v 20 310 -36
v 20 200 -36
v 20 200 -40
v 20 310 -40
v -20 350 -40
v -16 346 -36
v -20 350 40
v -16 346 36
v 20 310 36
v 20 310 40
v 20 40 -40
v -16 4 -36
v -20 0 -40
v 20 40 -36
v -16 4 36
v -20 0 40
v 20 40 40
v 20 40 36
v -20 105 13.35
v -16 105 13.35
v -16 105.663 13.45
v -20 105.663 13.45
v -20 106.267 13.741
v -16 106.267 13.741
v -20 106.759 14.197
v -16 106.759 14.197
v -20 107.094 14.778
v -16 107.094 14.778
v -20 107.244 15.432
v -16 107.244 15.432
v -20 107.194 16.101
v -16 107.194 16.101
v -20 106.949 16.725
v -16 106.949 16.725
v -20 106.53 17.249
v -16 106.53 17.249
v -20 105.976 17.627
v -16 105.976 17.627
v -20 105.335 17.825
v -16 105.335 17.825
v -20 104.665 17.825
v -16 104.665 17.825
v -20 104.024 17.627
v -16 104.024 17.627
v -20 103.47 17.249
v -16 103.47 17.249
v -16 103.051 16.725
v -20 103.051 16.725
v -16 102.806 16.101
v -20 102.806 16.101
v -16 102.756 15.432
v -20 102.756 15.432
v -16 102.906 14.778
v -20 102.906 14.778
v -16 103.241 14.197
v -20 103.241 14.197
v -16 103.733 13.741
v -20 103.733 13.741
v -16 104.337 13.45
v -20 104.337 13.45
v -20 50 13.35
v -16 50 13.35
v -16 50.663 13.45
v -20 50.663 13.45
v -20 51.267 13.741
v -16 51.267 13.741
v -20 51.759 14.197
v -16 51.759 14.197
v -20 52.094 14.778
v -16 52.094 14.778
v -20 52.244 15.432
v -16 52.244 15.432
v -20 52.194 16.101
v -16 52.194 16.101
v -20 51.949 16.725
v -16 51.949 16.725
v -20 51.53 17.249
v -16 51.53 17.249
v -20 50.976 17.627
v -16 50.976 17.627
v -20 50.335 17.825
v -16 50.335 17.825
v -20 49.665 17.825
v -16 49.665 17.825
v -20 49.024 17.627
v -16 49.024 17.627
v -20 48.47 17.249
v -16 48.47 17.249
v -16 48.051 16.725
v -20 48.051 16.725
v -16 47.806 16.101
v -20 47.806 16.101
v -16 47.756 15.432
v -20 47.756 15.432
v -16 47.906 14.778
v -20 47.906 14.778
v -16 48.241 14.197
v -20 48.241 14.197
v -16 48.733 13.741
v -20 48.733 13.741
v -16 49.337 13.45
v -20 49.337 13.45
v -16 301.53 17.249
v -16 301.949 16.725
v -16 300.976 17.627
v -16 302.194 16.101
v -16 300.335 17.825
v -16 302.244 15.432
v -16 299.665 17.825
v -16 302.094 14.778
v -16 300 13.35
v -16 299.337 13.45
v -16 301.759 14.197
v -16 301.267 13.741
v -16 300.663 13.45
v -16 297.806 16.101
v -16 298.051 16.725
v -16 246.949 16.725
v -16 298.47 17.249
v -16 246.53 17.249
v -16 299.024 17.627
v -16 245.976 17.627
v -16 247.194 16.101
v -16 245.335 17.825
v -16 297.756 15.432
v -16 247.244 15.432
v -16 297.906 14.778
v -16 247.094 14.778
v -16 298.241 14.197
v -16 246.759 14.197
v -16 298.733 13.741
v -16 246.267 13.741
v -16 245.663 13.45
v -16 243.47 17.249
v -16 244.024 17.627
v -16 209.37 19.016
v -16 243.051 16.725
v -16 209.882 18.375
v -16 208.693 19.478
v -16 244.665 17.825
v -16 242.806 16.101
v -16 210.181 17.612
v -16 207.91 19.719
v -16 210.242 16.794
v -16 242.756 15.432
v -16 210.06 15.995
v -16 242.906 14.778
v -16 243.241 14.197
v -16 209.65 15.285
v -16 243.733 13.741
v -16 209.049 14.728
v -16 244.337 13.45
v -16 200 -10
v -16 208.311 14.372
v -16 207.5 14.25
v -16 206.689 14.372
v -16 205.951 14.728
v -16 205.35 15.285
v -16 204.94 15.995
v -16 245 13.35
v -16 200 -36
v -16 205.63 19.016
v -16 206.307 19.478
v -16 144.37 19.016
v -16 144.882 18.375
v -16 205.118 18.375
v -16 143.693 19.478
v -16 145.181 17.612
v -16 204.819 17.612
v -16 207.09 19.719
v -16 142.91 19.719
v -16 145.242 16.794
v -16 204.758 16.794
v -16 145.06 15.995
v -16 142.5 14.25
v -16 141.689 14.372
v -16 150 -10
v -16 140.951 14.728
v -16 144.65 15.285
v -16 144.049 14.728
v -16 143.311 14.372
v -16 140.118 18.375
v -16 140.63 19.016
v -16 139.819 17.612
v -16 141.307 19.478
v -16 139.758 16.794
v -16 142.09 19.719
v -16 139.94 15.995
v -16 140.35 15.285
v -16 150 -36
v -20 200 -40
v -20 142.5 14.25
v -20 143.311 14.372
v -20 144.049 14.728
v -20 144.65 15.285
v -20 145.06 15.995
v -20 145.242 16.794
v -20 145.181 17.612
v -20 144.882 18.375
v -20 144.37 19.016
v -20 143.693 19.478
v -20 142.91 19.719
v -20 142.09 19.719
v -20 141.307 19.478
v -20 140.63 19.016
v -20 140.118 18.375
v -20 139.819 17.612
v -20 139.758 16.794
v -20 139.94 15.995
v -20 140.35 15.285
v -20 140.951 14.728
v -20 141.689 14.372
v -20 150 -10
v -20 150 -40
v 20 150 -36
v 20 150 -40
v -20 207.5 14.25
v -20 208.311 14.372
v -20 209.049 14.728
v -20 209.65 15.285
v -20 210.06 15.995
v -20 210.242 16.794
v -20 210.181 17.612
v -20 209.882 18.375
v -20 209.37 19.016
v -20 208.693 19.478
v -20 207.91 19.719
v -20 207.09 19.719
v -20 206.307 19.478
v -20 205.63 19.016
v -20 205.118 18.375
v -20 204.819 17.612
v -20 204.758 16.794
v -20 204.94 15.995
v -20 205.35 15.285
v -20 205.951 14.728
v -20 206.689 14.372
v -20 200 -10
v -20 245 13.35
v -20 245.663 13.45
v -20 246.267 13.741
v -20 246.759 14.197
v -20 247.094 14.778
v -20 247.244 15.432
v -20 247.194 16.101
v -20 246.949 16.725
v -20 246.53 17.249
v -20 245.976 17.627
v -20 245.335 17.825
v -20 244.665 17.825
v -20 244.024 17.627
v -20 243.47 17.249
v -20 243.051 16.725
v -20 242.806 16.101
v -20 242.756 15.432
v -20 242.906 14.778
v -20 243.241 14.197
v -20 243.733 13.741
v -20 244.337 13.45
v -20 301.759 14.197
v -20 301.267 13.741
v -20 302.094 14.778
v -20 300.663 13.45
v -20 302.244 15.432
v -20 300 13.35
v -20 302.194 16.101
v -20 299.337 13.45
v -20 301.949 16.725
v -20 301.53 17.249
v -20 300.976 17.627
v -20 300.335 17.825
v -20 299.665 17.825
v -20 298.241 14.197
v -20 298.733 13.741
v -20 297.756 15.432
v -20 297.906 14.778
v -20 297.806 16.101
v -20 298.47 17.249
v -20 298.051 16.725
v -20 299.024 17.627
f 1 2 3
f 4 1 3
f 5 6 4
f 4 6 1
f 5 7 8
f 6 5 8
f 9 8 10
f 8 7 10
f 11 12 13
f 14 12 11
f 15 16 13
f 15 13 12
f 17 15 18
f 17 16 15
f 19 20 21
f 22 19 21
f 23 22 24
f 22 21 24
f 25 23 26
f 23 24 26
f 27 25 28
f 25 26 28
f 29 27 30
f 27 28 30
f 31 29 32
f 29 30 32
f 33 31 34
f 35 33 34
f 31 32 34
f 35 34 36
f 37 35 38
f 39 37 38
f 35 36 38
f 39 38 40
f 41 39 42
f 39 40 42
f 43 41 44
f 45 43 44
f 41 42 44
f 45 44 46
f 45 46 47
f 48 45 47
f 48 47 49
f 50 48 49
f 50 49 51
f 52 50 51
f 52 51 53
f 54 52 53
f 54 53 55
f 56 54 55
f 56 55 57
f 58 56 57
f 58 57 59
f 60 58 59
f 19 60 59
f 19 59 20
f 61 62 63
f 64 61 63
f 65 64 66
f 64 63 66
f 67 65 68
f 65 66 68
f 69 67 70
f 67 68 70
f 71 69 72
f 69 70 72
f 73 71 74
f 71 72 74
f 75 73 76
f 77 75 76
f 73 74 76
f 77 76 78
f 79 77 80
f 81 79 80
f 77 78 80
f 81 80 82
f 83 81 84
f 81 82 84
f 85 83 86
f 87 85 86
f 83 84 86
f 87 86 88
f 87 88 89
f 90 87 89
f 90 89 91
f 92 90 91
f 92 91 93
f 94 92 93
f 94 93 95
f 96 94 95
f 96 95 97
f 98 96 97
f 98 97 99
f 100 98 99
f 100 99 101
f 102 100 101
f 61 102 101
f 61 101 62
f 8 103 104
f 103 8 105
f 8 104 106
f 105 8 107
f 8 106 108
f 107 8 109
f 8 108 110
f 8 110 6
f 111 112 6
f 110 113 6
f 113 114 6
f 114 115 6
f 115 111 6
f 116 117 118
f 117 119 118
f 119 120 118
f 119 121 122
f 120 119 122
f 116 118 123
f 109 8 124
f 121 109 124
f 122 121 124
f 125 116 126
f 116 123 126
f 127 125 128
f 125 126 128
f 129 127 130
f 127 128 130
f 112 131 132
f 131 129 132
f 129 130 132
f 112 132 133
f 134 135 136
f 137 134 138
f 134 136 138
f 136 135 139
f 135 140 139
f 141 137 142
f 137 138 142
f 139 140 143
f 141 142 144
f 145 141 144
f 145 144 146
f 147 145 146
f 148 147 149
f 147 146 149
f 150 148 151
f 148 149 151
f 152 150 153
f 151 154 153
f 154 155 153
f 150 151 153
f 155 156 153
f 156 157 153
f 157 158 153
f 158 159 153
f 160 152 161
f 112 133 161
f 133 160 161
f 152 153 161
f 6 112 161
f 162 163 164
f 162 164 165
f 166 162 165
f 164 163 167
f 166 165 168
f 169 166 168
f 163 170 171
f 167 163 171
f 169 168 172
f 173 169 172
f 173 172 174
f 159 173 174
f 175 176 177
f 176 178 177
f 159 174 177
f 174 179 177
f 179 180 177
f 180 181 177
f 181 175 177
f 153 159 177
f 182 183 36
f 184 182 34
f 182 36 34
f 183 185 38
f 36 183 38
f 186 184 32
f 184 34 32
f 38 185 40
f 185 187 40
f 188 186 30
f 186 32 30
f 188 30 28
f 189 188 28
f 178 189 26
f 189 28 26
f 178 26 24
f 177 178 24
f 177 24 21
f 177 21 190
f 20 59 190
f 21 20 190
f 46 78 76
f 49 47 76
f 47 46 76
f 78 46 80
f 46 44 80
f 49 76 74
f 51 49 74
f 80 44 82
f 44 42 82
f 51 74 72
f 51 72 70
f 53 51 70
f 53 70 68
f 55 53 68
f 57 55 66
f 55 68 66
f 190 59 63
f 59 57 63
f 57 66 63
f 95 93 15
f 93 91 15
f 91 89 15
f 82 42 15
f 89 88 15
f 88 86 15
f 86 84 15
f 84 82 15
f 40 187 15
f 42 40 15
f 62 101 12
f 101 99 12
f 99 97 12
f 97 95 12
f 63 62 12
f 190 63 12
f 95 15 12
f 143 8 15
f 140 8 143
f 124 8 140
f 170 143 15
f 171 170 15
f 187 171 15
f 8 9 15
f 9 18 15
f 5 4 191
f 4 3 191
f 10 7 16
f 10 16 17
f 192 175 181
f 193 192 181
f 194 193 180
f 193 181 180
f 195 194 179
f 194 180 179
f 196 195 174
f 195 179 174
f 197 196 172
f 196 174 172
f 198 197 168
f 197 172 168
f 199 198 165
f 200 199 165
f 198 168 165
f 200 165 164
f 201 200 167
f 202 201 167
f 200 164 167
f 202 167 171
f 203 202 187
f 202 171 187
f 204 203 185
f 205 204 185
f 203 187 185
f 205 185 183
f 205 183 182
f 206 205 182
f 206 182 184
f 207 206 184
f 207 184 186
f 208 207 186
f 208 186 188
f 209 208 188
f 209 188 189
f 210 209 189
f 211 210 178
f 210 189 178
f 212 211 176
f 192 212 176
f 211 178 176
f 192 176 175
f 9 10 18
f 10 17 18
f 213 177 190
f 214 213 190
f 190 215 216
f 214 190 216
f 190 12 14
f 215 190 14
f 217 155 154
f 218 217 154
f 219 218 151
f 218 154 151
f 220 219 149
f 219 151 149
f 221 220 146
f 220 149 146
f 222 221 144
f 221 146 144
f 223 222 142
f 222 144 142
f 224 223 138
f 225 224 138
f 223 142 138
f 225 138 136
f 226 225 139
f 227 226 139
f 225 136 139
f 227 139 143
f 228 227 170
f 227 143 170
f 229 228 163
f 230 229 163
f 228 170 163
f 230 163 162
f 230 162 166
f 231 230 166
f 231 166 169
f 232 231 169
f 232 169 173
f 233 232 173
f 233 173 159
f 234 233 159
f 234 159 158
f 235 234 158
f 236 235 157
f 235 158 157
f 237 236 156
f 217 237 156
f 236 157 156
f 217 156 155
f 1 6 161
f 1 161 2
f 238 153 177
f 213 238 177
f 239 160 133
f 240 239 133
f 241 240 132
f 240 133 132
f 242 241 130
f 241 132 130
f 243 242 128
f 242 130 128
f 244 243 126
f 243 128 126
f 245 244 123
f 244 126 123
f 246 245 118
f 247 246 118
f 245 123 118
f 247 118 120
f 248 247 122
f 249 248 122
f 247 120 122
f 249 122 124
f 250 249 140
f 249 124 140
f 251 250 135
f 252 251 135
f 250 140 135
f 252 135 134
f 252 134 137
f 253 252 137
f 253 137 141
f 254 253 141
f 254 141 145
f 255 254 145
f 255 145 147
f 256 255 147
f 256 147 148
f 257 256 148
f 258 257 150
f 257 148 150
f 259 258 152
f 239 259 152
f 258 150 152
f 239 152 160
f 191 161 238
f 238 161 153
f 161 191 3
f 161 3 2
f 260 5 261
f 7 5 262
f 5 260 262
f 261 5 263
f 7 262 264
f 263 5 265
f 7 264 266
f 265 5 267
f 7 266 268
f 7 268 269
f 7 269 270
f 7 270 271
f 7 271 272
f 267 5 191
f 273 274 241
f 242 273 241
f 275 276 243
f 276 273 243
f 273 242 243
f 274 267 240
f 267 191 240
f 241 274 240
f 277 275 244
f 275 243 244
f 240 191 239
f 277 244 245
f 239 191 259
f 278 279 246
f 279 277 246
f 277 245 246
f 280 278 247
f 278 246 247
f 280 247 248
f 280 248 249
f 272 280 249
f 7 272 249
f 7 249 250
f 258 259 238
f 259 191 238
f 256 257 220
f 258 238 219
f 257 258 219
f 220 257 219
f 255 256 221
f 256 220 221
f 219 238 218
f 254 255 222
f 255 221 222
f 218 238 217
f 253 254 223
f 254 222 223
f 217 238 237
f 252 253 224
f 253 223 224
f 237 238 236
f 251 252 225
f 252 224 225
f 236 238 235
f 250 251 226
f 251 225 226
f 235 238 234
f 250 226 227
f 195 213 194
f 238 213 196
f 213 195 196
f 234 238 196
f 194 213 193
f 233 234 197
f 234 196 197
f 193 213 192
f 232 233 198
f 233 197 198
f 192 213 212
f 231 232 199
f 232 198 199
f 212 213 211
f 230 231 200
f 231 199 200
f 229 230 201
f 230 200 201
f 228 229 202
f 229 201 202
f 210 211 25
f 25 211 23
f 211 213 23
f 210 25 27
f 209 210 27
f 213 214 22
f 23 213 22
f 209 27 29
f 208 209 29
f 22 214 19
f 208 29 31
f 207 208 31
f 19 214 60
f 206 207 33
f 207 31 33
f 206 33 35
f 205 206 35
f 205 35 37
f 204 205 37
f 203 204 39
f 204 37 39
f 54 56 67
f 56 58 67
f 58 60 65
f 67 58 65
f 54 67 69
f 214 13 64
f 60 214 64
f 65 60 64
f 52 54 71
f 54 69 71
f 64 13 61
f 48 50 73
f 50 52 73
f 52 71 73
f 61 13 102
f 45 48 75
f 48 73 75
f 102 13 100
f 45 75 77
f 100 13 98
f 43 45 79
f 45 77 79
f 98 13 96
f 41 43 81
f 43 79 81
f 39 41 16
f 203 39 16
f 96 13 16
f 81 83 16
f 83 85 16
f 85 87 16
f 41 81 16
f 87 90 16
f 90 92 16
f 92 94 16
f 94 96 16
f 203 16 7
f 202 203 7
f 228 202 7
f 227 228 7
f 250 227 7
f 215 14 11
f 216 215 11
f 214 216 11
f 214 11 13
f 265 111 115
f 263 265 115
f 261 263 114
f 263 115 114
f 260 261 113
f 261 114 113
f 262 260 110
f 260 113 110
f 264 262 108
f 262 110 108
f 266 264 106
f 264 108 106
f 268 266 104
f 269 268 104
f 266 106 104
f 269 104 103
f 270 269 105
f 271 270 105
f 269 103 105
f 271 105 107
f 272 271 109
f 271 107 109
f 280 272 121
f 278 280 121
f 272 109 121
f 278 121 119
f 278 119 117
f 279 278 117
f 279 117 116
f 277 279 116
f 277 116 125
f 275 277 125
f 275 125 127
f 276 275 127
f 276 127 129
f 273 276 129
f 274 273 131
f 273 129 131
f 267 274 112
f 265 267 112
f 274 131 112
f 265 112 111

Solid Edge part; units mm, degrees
sketch "Sketch1" plane through (0, 0, 0) normal (0, -1, 0) x (1, 0, 0)
  line L0 (20, 36) -> (-16, 36)
  line L1 (-16, 36) -> (-16, -36)
  line L2 (-16, -36) -> (20, -36)
  line L3 (20, -36) -> (20, -40)
  line L4 (20, -40) -> (-20, -40)
  line L5 (-20, -40) -> (-20, 40)
  line L6 (-20, 40) -> (20, 40)
  line L7 (20, 40) -> (20, 36)
  dimension "D1" = 80
  dimension "D2" = 40
  dimension "D3" = 4
  dimension "D4" = 4
extrude "Protrusion1" add sketch "Sketch1" against normal blind 350
sketch "Sketch2" plane through (0, 175, 40) normal (0, 0, 1) x (0, 1, 0)
  line L0 (-175, 20) -> (-135, -20)
extrude "Cutout1" cut sketch "Sketch2" against normal through all material side at (0.0354, 19.9646, 40)
sketch "Sketch3" plane through (0, 175, 40) normal (0, 0, 1) x (0, 1, 0)
  line L0 (175, 20) -> (135, -20)
extrude "Cutout2" cut sketch "Sketch3" against normal through all material side at (0.0354, 330.0354, 40)
hole "Bohrung_1" at (-16, 142.5, 17) direction (-1, 0, 0) diameter 5.5 end up to next
hole "Hole1" at (-16, 207.5, 17) direction (-1, 0, 0) diameter 5.5 end up to next
hole "Bohrung_3" at (-16, 50, 15.6) direction (-1, 0, 0) diameter 4.5 end up to next
hole "Hole2" at (-16, 105, 15.6) direction (-1, 0, 0) diameter 4.5 end up to next
hole "Hole3" at (-16, 245, 15.6) direction (-1, 0, 0) diameter 4.5 end up to next
hole "Hole4" at (-16, 300, 15.6) direction (-1, 0, 0) diameter 4.5 end up to next
sketch "Sketch4" plane through (20, 175, -38) normal (1, 0, 0) x (0, 1, 0)
  line L0 (-25, -2) -> (25, -2)
  line L1 (25, -2) -> (25, 28)
  line L2 (25, 28) -> (-25, 28)
  line L3 (-25, 28) -> (-25, -2)
  dimension "D1" = 50
  dimension "D2" = 30
extrude "Cutout3" cut sketch "Sketch4" against normal through all
